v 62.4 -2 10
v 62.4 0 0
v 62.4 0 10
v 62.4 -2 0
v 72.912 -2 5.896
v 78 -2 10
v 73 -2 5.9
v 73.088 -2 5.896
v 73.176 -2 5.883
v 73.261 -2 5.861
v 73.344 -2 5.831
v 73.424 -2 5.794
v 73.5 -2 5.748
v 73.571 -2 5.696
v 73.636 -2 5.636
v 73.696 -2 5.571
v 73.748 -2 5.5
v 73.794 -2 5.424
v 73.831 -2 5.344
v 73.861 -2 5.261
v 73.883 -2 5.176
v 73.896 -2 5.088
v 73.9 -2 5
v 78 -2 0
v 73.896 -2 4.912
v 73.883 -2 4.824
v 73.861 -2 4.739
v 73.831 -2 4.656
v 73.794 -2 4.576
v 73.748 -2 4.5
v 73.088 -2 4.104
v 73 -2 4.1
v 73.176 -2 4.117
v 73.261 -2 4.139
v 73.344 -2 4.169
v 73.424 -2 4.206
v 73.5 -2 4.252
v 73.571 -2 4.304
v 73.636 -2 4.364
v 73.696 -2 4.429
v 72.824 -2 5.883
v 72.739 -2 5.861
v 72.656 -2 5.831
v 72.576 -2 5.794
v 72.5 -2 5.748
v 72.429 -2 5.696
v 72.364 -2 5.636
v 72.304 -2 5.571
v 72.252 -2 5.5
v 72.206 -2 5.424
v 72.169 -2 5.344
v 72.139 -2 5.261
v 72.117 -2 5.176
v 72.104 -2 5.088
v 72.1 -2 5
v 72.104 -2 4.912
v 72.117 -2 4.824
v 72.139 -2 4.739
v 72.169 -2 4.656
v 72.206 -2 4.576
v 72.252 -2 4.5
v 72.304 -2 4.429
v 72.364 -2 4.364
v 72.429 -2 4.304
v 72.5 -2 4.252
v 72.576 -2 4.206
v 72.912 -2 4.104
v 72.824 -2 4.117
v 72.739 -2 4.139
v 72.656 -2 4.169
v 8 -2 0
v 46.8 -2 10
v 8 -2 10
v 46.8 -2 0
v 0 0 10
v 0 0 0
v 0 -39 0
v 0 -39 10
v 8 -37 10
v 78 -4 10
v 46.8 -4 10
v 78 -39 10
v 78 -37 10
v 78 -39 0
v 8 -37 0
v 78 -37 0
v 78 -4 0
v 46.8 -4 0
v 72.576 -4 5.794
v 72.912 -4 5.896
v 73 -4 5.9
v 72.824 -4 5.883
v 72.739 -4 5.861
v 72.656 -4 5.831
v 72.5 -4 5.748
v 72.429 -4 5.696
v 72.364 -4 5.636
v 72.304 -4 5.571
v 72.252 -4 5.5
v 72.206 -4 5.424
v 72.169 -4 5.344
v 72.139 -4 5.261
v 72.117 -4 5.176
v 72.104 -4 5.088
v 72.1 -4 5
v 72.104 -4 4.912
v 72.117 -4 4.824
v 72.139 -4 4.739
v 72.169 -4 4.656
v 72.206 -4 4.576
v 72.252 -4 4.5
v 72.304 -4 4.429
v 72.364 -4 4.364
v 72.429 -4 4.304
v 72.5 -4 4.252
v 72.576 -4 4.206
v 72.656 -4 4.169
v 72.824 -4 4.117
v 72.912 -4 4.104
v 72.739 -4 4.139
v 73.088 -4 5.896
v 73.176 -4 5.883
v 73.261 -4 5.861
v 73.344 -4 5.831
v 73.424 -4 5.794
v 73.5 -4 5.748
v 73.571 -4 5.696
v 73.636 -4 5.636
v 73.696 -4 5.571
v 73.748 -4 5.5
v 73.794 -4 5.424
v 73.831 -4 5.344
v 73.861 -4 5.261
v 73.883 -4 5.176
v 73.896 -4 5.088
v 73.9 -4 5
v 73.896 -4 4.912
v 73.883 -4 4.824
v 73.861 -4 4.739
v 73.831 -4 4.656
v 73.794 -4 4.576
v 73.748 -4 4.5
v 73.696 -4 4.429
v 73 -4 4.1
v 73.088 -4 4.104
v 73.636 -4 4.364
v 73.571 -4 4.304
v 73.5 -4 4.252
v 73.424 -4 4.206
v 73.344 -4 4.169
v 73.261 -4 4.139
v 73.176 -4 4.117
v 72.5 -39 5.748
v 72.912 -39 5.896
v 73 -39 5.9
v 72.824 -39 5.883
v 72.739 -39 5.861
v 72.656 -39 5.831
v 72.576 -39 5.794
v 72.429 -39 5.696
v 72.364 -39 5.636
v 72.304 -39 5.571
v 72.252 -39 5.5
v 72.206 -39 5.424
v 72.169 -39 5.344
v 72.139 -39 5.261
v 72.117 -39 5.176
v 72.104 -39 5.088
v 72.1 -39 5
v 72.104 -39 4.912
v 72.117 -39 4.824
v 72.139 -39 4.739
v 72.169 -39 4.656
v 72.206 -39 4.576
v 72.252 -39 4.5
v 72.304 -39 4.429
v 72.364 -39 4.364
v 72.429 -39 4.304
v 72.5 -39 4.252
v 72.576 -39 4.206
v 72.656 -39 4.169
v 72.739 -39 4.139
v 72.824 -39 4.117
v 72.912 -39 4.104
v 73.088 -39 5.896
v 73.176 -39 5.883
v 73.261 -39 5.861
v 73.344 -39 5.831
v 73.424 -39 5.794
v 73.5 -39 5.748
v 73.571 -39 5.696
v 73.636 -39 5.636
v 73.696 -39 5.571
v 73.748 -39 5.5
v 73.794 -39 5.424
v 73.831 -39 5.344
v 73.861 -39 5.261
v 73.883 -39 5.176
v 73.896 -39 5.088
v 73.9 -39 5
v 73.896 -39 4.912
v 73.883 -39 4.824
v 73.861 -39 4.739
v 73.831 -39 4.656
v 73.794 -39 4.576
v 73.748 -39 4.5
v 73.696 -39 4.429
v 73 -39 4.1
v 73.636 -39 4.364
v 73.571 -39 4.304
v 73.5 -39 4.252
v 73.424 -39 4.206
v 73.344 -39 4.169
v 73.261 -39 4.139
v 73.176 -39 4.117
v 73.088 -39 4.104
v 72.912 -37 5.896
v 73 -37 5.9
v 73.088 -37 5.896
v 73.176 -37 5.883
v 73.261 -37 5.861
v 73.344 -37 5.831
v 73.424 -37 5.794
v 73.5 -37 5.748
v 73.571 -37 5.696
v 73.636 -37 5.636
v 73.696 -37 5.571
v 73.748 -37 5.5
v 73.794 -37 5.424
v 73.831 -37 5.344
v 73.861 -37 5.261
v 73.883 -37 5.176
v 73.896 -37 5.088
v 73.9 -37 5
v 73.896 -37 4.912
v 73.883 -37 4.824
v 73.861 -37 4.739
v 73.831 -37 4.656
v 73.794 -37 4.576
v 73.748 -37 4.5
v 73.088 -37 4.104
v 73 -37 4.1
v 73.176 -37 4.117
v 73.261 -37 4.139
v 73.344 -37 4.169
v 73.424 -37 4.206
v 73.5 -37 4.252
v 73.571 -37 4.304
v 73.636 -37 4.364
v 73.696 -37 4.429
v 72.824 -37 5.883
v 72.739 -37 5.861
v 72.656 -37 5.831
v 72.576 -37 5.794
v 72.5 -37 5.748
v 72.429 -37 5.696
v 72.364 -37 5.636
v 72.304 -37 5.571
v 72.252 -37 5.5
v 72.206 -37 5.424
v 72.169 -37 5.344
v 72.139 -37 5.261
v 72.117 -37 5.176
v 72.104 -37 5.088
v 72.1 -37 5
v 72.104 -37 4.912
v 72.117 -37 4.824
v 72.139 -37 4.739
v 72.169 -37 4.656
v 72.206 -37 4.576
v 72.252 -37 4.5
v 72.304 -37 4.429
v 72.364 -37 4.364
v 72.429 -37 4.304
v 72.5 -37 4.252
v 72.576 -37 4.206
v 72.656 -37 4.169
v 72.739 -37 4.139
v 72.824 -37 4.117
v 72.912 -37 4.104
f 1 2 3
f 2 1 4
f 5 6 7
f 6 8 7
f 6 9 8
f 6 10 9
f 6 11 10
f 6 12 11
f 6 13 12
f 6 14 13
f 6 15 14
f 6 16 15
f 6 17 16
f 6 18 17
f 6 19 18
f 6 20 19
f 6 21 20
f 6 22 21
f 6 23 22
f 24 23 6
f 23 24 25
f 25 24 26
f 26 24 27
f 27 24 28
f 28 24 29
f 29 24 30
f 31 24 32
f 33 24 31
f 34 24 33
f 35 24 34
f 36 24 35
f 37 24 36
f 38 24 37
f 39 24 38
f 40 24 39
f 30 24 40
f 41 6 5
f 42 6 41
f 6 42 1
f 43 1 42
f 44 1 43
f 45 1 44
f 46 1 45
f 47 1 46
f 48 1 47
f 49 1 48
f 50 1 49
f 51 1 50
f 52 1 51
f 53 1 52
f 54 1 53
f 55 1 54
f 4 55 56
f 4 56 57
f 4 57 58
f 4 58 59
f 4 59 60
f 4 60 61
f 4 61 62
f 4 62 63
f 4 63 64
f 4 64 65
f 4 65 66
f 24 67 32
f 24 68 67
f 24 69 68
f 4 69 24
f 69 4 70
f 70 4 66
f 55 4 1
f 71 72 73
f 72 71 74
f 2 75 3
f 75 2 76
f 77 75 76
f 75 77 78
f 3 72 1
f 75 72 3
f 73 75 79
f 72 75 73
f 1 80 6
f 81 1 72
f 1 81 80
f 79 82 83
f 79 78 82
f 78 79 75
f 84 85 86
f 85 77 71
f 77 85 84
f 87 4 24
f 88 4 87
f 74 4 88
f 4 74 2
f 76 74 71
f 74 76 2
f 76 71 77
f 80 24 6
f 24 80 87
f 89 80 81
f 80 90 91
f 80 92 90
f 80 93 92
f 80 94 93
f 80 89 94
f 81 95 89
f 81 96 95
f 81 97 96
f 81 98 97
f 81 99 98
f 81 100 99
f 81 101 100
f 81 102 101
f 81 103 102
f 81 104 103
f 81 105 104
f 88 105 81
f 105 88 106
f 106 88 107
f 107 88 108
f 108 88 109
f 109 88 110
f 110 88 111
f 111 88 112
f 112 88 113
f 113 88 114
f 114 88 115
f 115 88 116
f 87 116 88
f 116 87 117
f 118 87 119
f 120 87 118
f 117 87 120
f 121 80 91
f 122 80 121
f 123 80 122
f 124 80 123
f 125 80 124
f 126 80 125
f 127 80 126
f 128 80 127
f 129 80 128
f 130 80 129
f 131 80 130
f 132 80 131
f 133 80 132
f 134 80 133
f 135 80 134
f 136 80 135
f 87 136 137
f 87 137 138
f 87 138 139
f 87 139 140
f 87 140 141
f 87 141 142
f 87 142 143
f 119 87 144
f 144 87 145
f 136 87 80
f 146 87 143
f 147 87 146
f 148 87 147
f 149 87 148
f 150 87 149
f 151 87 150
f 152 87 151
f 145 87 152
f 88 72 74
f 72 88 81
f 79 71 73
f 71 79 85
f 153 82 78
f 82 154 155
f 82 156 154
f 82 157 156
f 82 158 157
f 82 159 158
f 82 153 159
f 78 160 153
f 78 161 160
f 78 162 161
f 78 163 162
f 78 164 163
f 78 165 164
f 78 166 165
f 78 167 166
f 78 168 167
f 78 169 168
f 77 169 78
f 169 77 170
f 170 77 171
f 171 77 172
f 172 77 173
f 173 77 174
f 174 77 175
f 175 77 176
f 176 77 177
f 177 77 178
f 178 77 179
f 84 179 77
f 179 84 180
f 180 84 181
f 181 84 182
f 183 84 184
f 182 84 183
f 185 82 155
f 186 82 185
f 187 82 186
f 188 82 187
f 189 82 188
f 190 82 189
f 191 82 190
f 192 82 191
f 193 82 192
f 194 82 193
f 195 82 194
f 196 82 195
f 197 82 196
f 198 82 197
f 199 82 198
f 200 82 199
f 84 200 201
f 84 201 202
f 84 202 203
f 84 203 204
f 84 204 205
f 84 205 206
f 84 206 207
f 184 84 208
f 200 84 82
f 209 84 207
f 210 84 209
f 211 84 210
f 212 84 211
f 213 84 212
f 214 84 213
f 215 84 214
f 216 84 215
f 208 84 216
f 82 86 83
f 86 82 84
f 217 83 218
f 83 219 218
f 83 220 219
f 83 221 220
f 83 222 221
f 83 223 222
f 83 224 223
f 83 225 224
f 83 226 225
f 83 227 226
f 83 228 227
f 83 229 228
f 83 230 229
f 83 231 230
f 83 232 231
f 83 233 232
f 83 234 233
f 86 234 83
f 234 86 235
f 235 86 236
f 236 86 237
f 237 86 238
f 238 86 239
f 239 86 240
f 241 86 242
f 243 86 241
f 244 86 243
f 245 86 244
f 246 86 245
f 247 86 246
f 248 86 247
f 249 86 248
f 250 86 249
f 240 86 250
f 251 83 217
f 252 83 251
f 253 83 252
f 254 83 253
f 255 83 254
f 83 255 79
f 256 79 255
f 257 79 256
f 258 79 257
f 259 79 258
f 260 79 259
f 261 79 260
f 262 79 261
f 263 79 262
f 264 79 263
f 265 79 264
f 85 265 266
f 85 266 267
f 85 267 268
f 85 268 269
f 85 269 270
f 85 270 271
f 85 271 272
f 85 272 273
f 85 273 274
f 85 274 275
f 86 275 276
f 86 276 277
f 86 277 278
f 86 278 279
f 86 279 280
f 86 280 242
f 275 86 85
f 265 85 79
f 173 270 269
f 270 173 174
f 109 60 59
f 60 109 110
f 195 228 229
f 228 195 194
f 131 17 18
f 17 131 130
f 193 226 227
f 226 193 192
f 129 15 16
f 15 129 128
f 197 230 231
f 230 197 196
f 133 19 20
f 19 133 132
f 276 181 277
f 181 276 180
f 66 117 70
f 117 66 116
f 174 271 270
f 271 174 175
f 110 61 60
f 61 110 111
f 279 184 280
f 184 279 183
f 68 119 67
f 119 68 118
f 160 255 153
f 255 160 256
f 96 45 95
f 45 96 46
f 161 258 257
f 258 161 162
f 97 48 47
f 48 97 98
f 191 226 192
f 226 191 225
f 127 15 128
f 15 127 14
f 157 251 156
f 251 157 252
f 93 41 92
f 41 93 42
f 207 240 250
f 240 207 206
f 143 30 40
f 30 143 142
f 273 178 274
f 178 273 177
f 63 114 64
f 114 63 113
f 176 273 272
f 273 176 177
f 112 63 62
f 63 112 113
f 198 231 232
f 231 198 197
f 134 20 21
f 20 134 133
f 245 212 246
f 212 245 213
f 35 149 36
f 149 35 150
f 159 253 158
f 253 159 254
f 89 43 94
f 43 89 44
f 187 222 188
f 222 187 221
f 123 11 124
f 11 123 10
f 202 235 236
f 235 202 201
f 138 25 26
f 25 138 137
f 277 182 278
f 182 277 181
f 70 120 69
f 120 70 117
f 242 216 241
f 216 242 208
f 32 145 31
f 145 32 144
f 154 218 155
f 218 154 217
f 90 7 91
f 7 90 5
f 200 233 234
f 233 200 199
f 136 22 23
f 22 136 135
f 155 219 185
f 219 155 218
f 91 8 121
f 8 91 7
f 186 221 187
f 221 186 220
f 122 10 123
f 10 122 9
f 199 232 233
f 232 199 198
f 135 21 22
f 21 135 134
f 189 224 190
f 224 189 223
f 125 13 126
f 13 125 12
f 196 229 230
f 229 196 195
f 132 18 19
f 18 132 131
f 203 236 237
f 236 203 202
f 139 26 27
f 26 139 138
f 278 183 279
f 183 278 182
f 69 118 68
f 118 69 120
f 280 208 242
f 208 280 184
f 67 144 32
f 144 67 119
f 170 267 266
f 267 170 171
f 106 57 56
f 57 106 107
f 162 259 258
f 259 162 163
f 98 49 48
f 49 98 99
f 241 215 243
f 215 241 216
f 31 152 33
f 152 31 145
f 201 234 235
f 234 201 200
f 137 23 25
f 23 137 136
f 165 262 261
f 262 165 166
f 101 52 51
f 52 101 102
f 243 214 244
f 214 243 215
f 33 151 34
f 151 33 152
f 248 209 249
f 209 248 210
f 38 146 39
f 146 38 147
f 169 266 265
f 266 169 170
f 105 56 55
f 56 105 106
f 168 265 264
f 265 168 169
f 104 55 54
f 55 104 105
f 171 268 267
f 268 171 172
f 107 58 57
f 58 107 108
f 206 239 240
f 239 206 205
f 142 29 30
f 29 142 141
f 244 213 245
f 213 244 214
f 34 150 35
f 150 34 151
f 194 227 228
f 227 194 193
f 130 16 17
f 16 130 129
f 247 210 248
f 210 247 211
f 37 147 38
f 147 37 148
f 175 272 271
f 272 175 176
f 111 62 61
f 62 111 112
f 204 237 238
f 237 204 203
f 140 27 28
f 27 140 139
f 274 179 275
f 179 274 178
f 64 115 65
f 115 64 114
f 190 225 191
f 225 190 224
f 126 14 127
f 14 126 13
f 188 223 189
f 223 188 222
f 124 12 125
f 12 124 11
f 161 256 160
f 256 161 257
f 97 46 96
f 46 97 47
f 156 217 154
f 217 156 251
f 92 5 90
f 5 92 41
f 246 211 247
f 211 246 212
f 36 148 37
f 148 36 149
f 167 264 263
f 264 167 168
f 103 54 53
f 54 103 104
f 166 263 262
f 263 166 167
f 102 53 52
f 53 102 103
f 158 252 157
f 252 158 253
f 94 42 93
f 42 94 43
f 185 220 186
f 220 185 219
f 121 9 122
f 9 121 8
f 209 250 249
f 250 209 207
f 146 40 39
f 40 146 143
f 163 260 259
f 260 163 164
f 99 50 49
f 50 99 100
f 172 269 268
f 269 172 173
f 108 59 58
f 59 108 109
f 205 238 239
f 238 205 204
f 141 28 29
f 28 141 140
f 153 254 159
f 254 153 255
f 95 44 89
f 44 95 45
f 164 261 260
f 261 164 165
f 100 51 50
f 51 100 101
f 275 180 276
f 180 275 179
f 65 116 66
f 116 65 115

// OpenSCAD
width = 10;
rotor_radius = 60;
support_thickness = 8;
clearance = 5;
length = rotor_radius + support_thickness + clearance*2;
bottom_thickness = 2;
top_thickness = 2;
rotor_height = 25;
inner_height= rotor_height + clearance*2;
height = inner_height + bottom_thickness + top_thickness;
hole_radius = 0.9;
fn = 64;

module render()
{
  rotate(a=90, v=[1,0,0])
  difference() {
    union() {
      cube(size = [length * 4/5, width, bottom_thickness]);
      translate([length * 3/5, 0, bottom_thickness])
      cube(size = [length * 2/5, width, bottom_thickness]);
      cube(size = [support_thickness, width, height]);
      translate([0, 0, height-top_thickness])
      cube(size = [length, width, top_thickness]);
    }
    translate([length-clearance,
               width/2, -1])
    cylinder(h = height + 2, r1 = hole_radius,
             r2 = hole_radius, $fn=fn);
  }
}

echo(length=length);
echo(height=inner_height - bottom_thickness);
echo(version=version());

render();
